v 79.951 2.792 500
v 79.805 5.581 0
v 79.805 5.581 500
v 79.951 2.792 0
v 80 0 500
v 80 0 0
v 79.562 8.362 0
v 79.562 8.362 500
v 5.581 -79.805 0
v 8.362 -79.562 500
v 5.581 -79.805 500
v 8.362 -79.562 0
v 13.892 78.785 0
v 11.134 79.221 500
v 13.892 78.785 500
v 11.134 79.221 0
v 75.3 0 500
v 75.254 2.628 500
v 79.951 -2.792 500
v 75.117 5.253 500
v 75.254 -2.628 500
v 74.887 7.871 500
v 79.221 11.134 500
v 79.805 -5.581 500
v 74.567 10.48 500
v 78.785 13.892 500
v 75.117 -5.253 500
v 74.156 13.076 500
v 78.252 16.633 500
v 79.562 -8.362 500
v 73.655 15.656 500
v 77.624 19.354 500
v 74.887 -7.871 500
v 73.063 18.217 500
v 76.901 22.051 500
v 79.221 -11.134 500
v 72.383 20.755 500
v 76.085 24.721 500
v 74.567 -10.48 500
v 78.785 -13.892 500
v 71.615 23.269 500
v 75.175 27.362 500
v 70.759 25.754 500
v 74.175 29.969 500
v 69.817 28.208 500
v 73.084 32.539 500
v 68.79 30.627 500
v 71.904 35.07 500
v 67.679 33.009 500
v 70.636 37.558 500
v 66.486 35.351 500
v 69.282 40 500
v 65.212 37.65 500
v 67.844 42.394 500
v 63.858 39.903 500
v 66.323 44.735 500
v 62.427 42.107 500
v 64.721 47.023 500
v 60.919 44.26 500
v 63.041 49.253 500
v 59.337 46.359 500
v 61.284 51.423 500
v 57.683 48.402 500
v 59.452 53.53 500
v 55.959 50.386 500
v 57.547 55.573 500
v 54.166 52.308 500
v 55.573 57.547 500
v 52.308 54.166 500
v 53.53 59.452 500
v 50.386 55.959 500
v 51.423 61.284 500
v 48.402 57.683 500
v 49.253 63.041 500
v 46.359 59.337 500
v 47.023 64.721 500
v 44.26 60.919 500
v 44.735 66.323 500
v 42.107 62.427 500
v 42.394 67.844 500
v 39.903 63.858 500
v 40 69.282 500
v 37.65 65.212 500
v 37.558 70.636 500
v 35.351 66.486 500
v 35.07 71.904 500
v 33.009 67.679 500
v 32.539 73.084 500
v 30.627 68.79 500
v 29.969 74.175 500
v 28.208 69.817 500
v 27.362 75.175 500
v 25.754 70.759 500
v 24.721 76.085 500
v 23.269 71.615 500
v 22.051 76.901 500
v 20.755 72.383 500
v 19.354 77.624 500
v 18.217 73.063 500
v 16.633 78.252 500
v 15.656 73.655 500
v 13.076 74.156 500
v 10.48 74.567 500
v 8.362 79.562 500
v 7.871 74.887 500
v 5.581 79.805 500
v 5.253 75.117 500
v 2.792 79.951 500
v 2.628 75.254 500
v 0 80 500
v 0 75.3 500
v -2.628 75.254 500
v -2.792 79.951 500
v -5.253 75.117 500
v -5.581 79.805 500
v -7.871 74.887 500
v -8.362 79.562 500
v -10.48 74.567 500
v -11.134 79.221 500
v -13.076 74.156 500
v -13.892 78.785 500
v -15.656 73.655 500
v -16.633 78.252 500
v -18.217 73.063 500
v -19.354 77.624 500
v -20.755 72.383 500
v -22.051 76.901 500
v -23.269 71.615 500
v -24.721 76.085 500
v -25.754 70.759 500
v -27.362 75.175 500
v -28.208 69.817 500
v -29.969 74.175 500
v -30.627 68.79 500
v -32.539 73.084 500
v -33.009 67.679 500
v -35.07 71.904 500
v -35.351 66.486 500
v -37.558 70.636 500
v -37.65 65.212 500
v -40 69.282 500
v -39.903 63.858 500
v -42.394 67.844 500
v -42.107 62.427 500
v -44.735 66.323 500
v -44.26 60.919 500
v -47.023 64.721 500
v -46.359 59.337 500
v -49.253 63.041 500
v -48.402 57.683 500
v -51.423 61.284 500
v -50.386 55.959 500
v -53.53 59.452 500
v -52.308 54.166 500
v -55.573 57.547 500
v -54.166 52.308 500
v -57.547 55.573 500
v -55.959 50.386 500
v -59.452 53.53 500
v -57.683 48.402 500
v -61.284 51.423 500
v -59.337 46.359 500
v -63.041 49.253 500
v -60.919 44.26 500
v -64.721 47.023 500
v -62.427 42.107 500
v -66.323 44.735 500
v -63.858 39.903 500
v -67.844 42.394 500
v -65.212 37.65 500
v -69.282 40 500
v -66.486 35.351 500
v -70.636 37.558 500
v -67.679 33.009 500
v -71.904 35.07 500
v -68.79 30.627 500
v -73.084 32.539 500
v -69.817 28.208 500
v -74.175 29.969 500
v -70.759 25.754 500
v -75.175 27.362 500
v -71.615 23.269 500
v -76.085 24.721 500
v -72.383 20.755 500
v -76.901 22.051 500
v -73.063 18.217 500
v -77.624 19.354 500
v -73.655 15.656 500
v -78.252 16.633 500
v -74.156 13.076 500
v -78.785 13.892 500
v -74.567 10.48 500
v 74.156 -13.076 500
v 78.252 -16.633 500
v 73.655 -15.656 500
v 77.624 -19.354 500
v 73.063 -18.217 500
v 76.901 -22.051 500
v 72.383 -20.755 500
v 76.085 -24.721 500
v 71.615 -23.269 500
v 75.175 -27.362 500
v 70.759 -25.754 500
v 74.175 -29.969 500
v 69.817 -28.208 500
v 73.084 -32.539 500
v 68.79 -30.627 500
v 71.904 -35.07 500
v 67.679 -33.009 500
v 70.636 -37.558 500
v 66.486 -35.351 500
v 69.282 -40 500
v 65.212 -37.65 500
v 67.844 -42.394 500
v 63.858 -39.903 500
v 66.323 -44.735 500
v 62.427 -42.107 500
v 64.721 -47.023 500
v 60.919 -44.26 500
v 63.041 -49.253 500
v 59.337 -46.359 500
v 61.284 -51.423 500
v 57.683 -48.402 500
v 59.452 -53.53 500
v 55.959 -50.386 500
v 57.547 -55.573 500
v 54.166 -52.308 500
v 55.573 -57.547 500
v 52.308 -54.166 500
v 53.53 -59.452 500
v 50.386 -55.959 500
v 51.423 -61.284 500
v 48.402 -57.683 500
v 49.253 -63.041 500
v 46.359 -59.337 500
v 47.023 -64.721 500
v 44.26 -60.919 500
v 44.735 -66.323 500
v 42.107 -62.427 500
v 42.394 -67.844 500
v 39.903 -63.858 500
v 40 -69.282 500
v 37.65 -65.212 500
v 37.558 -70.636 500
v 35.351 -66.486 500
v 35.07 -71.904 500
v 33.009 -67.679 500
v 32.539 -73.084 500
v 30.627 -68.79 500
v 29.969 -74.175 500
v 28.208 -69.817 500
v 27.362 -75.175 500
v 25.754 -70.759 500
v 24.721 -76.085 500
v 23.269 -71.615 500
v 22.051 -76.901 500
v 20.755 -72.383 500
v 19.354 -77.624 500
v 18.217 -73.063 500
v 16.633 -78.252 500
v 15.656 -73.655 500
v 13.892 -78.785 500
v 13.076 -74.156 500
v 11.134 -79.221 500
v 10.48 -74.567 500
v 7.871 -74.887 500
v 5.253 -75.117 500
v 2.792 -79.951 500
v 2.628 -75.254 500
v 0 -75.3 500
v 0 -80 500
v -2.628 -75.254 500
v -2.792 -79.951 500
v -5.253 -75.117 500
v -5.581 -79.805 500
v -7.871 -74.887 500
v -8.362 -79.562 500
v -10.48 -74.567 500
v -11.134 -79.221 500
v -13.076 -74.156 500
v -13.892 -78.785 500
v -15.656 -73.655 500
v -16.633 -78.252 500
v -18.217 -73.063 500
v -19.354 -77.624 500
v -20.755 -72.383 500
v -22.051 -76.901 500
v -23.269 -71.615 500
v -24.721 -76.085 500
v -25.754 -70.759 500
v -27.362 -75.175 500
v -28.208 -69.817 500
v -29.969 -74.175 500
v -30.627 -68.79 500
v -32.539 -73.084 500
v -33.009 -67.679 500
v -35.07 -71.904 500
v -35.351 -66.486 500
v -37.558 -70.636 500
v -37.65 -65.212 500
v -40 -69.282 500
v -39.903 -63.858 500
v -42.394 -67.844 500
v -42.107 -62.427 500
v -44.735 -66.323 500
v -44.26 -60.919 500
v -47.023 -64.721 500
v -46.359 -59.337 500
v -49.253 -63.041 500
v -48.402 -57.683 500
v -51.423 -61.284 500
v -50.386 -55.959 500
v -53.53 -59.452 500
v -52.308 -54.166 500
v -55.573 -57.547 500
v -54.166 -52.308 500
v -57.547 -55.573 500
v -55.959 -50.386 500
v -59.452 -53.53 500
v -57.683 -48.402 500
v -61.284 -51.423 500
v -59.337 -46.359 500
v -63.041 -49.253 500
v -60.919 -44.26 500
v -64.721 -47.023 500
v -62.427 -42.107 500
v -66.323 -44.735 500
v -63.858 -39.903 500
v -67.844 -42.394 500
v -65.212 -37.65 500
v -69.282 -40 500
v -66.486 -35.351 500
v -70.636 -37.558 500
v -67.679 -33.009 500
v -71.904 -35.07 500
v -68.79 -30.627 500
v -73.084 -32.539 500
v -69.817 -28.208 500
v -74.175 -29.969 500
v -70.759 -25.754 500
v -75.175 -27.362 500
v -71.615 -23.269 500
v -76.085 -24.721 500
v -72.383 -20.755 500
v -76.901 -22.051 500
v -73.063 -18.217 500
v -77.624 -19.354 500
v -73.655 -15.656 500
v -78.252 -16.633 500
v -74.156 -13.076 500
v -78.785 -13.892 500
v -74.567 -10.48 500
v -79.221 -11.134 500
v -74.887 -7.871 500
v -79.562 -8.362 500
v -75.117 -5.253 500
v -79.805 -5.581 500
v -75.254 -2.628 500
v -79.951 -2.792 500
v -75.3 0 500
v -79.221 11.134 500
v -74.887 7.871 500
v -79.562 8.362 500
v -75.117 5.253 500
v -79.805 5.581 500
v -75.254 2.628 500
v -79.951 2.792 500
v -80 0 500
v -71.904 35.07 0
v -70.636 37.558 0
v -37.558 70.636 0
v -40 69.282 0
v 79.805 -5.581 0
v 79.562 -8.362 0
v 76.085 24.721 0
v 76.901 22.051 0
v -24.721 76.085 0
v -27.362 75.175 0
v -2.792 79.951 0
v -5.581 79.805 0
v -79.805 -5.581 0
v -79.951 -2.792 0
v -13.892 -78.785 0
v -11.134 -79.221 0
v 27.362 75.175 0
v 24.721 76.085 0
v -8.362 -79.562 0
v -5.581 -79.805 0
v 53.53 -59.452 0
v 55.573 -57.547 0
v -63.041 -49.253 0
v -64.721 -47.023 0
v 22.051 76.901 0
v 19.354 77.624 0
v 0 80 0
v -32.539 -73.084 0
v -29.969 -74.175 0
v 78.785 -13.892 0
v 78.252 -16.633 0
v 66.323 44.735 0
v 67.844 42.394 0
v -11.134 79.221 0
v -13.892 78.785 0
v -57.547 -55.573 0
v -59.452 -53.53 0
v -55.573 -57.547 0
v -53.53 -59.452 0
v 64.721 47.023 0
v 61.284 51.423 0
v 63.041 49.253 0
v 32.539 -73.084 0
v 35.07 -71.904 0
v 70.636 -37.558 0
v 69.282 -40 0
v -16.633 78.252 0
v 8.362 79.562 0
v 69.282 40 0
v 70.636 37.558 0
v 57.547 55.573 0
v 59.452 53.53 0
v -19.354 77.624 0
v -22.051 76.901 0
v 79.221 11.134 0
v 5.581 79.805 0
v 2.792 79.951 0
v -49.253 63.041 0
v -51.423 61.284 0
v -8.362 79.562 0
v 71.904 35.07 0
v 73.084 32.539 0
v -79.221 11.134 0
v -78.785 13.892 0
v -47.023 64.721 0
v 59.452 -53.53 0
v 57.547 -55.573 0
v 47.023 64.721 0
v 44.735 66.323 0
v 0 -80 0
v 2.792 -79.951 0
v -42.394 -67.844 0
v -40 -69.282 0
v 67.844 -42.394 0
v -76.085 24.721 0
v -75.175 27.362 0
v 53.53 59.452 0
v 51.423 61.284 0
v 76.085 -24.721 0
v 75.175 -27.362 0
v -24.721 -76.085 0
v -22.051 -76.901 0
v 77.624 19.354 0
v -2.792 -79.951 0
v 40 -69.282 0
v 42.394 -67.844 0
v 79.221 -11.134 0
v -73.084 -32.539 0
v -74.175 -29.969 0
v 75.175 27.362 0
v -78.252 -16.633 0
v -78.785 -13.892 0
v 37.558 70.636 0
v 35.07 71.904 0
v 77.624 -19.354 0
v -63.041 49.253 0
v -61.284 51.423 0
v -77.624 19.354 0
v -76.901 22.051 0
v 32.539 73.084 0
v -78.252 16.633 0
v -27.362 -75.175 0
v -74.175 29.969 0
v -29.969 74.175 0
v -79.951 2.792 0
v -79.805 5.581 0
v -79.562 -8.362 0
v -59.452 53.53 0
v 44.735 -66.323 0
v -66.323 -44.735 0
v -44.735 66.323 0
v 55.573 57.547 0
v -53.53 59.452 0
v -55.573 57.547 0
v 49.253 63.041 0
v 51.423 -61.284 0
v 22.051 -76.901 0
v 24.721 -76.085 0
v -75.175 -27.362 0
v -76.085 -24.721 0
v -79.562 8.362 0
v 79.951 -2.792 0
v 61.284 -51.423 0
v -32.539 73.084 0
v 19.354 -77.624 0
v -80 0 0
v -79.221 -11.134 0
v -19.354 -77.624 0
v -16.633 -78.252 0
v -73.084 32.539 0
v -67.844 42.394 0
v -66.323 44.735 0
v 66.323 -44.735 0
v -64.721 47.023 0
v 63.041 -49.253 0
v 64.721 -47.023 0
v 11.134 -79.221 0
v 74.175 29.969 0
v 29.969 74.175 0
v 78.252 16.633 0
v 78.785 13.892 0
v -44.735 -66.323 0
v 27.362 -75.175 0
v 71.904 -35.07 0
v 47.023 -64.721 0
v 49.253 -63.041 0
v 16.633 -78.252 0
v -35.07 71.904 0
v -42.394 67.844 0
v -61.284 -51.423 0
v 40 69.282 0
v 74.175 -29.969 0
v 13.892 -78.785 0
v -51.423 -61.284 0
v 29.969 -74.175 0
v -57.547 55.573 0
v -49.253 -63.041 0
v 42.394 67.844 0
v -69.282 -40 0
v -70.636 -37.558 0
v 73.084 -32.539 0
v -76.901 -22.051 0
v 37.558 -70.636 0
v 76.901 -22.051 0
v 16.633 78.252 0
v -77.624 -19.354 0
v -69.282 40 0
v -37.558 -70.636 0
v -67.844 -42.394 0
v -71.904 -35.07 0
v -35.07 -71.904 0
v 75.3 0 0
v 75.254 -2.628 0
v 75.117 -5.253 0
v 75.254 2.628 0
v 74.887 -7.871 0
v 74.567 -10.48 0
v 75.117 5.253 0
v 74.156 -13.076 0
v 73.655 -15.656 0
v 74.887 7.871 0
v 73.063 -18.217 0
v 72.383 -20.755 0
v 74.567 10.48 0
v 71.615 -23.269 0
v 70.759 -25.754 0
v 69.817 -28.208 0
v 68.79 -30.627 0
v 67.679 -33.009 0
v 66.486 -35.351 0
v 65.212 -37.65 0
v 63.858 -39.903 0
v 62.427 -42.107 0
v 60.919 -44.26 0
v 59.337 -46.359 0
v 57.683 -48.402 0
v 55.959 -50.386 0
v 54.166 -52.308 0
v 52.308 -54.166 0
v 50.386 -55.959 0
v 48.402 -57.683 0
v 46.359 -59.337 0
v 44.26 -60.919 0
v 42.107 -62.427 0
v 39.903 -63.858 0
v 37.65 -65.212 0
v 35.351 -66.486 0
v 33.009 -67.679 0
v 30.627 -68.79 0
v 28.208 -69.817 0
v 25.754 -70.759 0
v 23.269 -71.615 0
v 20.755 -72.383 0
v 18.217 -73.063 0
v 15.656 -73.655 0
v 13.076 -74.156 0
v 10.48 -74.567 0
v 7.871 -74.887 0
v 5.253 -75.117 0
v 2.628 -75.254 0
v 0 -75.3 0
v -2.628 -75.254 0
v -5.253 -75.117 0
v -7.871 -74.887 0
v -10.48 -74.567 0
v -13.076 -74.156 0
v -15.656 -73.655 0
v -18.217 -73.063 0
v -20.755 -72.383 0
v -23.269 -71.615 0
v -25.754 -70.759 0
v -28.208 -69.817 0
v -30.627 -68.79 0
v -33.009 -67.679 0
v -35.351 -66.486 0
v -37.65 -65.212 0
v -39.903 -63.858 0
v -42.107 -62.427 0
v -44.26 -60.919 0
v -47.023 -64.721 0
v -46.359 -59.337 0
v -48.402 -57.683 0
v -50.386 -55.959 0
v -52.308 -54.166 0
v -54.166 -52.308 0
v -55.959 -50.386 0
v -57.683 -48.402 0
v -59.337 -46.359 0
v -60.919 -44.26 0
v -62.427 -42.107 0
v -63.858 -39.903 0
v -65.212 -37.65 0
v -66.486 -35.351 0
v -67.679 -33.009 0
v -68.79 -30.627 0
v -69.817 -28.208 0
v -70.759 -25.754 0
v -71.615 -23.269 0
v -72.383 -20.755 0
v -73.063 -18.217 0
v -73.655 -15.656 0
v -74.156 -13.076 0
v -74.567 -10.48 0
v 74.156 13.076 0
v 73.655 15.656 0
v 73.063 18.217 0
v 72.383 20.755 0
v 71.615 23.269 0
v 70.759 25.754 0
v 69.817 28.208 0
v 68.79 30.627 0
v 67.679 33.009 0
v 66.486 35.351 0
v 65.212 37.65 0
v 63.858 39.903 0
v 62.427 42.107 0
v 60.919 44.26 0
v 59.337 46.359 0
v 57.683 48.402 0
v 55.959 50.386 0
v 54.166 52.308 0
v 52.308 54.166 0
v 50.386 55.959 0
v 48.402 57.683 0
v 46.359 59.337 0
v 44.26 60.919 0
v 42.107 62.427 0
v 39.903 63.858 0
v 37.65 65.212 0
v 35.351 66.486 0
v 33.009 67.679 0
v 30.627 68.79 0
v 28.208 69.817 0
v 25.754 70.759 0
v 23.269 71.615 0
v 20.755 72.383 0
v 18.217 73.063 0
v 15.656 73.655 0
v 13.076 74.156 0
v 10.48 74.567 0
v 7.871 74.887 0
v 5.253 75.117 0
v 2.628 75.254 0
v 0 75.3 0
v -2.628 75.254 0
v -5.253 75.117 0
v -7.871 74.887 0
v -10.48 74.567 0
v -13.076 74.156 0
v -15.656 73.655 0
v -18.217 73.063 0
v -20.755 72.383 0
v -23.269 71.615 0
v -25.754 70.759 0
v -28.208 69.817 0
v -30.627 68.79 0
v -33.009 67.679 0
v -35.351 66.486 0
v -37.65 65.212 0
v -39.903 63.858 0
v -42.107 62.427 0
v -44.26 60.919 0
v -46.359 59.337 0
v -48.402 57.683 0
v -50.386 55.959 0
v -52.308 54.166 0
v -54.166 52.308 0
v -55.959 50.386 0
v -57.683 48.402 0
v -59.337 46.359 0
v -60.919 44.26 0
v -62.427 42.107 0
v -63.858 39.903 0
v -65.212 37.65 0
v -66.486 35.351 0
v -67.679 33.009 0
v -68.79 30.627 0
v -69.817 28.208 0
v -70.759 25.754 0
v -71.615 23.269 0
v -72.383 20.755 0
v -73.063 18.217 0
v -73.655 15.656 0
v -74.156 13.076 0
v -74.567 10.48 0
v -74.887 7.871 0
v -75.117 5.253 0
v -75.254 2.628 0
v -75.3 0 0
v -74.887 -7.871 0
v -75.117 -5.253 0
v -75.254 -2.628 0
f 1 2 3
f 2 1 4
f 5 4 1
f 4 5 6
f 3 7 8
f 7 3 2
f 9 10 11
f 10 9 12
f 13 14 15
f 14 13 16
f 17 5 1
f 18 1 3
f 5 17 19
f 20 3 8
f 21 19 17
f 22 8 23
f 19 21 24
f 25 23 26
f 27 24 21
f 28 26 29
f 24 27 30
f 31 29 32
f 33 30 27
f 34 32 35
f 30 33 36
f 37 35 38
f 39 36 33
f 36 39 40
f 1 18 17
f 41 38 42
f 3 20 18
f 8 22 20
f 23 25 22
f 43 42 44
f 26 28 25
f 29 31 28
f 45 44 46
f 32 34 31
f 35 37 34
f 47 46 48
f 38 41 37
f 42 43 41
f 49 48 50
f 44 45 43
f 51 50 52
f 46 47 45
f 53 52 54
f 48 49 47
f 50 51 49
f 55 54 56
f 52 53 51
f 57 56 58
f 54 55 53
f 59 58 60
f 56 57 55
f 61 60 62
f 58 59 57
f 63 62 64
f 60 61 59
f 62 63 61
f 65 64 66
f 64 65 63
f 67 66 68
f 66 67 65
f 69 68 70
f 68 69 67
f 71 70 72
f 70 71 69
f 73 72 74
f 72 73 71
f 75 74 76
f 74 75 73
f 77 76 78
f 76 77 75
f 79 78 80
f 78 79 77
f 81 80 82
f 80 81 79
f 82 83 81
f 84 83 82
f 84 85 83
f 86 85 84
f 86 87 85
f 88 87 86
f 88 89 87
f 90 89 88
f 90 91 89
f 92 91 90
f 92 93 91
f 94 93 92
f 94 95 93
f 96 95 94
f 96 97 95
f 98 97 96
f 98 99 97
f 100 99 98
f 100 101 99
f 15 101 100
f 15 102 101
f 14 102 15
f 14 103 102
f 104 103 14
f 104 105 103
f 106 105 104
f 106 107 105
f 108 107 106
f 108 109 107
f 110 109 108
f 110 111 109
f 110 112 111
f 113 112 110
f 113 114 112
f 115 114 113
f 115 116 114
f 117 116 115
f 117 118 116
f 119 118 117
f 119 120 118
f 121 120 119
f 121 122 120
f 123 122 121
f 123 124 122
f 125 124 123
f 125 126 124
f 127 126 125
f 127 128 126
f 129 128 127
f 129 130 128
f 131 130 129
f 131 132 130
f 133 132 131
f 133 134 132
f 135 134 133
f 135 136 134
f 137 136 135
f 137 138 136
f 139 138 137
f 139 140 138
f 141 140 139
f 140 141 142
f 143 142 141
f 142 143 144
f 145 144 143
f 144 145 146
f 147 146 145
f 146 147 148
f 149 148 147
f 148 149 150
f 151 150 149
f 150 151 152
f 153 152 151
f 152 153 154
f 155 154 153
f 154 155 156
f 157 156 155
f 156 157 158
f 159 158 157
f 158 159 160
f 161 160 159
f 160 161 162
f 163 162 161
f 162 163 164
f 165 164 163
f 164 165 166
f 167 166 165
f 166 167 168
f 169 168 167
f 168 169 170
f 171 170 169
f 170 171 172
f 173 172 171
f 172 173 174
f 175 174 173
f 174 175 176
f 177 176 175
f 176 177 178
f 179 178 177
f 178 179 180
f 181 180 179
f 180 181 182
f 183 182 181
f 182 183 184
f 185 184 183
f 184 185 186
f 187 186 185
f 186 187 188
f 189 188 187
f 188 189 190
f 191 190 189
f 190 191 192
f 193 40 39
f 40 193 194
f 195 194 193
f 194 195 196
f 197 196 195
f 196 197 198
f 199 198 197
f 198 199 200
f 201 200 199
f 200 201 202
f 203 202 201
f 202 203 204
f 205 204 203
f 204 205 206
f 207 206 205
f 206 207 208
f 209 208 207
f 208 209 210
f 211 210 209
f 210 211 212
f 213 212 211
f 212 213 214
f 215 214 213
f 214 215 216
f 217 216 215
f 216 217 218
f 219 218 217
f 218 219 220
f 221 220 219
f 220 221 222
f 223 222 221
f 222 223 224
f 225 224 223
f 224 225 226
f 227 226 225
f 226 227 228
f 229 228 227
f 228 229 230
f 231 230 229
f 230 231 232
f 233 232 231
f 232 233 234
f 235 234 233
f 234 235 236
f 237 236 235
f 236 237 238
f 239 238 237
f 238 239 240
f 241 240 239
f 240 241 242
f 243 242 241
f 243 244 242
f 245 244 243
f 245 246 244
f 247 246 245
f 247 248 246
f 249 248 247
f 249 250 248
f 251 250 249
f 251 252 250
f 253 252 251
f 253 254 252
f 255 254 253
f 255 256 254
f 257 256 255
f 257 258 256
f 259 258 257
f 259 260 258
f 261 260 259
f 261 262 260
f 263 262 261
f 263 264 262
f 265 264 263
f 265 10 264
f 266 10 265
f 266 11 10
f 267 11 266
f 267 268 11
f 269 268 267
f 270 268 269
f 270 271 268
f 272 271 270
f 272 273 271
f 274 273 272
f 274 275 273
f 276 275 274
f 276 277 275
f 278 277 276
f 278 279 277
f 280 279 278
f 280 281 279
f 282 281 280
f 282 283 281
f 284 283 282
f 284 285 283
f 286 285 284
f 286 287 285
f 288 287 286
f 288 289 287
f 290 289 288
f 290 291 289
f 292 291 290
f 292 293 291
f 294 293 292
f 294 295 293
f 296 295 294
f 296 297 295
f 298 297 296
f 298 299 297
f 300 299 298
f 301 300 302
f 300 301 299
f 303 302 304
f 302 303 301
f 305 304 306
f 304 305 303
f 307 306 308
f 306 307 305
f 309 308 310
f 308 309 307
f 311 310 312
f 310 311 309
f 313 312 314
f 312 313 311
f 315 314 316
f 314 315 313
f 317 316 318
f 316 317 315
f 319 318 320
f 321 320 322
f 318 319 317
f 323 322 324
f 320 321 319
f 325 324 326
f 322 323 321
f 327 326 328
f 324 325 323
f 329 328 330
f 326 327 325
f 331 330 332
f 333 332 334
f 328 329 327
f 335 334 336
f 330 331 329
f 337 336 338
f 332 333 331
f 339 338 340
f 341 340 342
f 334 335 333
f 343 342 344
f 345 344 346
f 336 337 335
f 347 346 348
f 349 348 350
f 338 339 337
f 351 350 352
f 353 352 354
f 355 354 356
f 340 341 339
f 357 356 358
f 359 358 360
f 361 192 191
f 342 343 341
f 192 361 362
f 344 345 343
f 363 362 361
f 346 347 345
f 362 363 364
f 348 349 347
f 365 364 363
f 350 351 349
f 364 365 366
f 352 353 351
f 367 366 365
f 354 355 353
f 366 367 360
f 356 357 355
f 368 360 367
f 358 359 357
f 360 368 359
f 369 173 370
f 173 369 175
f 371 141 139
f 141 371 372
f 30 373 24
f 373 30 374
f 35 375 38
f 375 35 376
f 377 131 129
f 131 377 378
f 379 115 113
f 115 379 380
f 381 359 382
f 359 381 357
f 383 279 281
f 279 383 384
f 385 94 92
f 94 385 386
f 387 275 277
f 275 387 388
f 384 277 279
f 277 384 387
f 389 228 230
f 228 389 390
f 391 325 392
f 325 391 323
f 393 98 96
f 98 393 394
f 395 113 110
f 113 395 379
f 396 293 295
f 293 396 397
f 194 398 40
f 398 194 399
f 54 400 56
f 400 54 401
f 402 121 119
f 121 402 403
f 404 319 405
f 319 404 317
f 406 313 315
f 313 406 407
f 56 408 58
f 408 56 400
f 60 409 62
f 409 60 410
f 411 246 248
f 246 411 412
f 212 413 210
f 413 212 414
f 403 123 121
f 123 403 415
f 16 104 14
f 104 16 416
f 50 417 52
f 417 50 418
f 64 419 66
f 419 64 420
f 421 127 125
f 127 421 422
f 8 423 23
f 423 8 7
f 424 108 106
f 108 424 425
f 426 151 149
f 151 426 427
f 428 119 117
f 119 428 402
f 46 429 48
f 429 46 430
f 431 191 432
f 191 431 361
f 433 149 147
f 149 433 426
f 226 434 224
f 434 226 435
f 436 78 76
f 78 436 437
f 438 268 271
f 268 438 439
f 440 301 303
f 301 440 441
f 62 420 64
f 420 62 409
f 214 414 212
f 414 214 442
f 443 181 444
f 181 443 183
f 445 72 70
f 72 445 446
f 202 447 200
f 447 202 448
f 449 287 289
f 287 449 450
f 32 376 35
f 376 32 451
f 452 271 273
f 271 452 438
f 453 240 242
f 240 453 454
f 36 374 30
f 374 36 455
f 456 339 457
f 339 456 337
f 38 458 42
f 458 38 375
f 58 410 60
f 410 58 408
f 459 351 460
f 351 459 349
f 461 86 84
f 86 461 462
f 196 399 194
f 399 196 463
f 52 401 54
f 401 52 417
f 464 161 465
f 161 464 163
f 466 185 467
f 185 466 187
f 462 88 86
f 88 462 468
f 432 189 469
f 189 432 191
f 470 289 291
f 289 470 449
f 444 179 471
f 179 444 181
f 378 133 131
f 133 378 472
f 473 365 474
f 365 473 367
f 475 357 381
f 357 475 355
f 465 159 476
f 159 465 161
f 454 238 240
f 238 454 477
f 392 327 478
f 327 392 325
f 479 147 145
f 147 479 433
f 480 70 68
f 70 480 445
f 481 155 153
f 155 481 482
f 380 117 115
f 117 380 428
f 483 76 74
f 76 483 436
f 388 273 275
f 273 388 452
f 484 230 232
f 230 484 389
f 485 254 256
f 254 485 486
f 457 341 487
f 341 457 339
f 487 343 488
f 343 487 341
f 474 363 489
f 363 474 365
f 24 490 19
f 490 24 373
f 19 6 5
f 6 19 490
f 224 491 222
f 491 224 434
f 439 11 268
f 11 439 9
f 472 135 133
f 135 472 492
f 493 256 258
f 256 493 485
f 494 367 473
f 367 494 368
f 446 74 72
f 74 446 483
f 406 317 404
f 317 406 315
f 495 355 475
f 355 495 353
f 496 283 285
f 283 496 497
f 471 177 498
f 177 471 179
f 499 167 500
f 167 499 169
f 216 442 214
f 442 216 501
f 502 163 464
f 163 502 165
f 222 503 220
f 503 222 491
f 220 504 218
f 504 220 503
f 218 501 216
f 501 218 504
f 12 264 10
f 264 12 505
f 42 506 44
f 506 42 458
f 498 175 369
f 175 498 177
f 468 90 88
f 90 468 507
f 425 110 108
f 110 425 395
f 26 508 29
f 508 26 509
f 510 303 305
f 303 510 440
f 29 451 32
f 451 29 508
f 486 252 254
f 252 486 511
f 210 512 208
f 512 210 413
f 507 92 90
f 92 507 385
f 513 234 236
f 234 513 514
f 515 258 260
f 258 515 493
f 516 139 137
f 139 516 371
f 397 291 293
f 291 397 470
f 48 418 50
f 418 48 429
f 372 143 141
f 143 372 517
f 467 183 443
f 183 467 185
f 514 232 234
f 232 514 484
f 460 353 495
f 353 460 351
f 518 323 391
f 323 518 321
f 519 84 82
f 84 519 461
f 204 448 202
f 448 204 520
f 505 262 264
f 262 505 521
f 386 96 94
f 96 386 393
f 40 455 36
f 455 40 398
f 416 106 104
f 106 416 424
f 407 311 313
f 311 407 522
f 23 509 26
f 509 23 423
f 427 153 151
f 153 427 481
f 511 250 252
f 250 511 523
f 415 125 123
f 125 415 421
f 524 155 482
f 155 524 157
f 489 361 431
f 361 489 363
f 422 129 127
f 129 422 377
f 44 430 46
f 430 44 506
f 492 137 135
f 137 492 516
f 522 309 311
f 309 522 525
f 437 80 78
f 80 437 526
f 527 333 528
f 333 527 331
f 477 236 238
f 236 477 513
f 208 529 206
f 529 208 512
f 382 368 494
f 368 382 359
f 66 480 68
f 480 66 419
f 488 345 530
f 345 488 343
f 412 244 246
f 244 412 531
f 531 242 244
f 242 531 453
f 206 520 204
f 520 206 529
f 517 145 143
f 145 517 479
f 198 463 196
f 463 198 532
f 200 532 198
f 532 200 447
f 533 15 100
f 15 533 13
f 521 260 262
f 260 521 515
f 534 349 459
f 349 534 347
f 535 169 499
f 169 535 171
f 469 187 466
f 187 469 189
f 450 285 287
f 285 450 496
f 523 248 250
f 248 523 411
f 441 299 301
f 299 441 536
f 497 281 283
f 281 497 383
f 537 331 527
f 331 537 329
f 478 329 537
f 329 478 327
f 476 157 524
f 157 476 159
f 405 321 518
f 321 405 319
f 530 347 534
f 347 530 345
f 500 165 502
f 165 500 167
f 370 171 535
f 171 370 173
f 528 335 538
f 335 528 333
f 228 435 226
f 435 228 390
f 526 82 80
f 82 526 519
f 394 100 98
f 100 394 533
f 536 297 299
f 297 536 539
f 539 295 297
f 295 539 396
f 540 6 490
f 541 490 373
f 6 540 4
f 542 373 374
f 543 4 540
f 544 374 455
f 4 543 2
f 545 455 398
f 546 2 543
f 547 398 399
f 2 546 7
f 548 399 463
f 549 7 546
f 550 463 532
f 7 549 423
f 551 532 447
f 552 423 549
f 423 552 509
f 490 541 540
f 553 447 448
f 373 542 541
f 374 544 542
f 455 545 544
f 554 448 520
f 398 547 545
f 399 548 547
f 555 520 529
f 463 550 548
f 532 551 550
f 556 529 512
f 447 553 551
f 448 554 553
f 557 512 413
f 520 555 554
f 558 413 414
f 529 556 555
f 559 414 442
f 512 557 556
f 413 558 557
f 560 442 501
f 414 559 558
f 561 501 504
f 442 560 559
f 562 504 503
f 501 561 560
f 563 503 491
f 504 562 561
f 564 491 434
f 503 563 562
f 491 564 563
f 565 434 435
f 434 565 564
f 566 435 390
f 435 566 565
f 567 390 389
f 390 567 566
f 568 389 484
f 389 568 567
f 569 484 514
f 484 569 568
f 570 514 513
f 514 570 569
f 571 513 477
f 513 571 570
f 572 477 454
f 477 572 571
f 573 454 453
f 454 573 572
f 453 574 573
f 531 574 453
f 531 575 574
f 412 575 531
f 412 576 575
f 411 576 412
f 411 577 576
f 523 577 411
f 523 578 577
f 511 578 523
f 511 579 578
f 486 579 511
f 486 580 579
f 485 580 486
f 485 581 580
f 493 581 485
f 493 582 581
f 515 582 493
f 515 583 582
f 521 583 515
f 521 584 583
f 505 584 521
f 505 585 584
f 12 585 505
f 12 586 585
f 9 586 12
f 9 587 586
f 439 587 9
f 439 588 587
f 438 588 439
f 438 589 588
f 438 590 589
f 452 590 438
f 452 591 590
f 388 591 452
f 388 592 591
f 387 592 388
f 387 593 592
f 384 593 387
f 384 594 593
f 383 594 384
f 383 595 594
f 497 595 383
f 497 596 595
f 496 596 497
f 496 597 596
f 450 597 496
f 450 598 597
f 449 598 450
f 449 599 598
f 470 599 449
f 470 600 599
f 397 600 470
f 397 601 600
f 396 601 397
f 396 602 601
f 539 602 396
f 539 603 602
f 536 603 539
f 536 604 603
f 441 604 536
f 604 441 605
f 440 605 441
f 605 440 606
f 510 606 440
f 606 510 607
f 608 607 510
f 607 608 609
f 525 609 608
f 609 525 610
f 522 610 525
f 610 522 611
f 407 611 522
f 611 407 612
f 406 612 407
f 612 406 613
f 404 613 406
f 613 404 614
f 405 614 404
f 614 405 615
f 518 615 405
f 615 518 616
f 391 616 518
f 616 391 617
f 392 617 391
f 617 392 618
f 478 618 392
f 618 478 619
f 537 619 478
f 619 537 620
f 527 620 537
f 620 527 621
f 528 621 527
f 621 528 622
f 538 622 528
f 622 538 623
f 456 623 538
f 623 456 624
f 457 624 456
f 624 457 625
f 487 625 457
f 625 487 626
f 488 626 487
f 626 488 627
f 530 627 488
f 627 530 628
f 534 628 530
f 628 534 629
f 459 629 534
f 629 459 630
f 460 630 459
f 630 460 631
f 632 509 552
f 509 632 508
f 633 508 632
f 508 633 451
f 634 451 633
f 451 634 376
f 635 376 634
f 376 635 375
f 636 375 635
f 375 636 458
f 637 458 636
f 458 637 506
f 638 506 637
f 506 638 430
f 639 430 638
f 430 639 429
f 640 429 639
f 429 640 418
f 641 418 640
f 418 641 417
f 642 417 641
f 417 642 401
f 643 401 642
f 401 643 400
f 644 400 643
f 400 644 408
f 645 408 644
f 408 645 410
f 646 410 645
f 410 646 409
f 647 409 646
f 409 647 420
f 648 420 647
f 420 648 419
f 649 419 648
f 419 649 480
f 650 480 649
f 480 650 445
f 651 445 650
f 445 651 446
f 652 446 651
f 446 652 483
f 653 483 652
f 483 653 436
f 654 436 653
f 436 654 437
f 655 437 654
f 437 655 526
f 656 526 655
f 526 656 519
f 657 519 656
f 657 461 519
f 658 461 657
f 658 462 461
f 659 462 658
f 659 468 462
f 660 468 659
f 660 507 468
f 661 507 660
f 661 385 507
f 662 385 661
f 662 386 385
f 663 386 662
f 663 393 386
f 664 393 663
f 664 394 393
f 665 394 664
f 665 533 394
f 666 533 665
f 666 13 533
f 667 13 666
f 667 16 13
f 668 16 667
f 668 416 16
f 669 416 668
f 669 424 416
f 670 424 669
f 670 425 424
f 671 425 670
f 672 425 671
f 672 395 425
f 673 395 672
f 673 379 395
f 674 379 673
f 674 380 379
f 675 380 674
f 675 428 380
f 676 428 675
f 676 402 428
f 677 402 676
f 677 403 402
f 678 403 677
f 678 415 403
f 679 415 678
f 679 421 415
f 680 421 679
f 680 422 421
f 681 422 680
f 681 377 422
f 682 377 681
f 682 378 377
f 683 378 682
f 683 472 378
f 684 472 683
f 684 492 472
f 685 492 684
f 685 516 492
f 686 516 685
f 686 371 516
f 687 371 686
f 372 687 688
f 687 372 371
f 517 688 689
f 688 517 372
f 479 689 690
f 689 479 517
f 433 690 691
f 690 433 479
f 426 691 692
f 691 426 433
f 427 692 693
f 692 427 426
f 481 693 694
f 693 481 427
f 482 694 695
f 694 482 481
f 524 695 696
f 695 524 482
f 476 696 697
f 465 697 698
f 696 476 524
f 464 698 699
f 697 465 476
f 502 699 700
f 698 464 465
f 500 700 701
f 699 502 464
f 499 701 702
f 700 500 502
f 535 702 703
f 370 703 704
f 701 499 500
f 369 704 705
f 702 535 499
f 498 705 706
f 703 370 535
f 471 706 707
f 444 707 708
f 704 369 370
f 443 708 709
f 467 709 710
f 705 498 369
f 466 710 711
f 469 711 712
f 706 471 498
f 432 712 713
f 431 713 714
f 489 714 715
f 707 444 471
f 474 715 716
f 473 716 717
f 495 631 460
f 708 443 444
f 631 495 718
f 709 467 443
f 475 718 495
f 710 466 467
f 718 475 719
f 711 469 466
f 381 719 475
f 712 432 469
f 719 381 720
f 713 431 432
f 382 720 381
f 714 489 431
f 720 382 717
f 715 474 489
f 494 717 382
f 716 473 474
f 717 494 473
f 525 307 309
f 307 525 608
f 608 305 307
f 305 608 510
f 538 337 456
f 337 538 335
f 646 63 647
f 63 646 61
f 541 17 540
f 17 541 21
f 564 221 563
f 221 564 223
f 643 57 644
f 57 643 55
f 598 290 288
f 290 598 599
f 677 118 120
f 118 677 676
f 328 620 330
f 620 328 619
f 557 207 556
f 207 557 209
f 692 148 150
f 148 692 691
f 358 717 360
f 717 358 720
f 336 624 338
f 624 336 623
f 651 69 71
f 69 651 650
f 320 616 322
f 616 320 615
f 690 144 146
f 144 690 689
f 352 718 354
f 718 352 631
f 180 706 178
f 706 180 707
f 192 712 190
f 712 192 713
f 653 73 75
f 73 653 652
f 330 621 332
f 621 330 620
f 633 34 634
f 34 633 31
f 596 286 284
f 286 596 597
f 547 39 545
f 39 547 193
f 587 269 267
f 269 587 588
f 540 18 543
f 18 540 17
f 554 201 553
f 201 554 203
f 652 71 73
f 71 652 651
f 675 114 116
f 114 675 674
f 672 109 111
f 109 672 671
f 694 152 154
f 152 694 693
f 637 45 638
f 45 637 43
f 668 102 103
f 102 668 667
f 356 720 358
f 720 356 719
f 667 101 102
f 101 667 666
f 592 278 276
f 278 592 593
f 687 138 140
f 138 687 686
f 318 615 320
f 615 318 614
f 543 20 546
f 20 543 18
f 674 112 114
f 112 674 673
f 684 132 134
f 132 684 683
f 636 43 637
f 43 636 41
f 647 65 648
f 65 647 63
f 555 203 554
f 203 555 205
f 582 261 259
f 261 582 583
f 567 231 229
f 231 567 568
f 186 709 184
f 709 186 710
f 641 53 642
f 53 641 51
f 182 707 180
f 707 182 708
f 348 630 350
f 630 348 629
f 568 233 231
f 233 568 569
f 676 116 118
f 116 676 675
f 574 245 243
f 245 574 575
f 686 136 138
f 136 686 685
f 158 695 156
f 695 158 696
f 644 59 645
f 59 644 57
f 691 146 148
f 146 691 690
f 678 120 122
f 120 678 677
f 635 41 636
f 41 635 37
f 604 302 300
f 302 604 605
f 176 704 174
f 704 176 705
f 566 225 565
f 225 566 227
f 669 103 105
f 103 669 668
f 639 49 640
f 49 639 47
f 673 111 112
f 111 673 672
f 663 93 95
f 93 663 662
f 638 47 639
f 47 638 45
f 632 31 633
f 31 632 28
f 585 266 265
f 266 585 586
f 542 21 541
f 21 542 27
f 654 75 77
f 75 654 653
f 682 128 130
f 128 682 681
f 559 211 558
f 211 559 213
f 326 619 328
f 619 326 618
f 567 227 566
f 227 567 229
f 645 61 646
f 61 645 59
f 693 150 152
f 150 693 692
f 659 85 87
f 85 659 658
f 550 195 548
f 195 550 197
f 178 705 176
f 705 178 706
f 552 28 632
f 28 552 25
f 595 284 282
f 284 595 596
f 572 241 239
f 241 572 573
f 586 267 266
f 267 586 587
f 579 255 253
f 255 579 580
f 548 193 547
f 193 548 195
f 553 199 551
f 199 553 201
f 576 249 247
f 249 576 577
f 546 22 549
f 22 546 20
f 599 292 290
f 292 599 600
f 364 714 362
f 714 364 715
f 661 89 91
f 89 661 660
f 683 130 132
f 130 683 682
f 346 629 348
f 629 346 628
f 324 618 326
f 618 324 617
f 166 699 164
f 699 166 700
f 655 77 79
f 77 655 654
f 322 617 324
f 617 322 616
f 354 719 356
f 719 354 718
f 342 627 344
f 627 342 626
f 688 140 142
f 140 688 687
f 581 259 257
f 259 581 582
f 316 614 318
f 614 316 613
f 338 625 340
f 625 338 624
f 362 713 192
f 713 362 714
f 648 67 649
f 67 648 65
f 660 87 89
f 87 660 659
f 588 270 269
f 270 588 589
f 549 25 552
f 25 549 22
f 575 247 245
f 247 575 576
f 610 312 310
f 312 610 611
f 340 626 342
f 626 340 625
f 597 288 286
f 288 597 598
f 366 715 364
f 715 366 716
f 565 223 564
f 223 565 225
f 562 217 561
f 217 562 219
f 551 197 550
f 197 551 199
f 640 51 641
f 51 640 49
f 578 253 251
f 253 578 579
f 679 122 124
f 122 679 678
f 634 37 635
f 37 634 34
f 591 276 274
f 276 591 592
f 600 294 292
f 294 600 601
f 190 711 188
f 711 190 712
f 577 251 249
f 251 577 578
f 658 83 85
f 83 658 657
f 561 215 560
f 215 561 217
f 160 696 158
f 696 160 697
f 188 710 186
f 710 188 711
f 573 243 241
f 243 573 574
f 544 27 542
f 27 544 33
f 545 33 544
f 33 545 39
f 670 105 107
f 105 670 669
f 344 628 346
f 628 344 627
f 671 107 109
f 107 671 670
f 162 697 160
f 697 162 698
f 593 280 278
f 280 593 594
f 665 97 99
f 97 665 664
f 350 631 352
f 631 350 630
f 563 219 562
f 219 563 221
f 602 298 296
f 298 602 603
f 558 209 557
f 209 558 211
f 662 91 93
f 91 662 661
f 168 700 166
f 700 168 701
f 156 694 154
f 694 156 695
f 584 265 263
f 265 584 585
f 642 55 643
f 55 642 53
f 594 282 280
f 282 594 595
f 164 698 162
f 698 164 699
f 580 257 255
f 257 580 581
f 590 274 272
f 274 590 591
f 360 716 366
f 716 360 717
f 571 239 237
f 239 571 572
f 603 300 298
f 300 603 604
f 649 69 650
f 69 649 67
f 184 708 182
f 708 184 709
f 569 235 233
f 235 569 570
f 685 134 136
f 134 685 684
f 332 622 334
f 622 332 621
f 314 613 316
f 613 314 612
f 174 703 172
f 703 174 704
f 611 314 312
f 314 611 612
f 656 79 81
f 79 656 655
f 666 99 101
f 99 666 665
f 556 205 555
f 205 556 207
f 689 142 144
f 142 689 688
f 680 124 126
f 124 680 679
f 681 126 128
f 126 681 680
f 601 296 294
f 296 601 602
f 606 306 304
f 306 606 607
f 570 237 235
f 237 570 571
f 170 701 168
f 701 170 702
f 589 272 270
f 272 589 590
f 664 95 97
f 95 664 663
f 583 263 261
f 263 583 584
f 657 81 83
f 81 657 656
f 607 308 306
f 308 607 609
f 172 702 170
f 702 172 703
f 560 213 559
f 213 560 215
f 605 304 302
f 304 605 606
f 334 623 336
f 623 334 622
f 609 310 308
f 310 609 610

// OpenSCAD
$fn = 180;

// HT pipe parameters (mm)
outer_d = 160;     // nominal HT 160 outer diameter
length  = 500;     // pipe length
wall    = 4.7;     // typical HT wall thickness (approx.)
inner_d = outer_d - 2*wall;

module ht_pipe(od, id, L) {
    difference() {
        cylinder(h = L, d = od);
        translate([0,0,-0.1]) cylinder(h = L + 0.2, d = id);
    }
}

ht_pipe(outer_d, inner_d, length);
